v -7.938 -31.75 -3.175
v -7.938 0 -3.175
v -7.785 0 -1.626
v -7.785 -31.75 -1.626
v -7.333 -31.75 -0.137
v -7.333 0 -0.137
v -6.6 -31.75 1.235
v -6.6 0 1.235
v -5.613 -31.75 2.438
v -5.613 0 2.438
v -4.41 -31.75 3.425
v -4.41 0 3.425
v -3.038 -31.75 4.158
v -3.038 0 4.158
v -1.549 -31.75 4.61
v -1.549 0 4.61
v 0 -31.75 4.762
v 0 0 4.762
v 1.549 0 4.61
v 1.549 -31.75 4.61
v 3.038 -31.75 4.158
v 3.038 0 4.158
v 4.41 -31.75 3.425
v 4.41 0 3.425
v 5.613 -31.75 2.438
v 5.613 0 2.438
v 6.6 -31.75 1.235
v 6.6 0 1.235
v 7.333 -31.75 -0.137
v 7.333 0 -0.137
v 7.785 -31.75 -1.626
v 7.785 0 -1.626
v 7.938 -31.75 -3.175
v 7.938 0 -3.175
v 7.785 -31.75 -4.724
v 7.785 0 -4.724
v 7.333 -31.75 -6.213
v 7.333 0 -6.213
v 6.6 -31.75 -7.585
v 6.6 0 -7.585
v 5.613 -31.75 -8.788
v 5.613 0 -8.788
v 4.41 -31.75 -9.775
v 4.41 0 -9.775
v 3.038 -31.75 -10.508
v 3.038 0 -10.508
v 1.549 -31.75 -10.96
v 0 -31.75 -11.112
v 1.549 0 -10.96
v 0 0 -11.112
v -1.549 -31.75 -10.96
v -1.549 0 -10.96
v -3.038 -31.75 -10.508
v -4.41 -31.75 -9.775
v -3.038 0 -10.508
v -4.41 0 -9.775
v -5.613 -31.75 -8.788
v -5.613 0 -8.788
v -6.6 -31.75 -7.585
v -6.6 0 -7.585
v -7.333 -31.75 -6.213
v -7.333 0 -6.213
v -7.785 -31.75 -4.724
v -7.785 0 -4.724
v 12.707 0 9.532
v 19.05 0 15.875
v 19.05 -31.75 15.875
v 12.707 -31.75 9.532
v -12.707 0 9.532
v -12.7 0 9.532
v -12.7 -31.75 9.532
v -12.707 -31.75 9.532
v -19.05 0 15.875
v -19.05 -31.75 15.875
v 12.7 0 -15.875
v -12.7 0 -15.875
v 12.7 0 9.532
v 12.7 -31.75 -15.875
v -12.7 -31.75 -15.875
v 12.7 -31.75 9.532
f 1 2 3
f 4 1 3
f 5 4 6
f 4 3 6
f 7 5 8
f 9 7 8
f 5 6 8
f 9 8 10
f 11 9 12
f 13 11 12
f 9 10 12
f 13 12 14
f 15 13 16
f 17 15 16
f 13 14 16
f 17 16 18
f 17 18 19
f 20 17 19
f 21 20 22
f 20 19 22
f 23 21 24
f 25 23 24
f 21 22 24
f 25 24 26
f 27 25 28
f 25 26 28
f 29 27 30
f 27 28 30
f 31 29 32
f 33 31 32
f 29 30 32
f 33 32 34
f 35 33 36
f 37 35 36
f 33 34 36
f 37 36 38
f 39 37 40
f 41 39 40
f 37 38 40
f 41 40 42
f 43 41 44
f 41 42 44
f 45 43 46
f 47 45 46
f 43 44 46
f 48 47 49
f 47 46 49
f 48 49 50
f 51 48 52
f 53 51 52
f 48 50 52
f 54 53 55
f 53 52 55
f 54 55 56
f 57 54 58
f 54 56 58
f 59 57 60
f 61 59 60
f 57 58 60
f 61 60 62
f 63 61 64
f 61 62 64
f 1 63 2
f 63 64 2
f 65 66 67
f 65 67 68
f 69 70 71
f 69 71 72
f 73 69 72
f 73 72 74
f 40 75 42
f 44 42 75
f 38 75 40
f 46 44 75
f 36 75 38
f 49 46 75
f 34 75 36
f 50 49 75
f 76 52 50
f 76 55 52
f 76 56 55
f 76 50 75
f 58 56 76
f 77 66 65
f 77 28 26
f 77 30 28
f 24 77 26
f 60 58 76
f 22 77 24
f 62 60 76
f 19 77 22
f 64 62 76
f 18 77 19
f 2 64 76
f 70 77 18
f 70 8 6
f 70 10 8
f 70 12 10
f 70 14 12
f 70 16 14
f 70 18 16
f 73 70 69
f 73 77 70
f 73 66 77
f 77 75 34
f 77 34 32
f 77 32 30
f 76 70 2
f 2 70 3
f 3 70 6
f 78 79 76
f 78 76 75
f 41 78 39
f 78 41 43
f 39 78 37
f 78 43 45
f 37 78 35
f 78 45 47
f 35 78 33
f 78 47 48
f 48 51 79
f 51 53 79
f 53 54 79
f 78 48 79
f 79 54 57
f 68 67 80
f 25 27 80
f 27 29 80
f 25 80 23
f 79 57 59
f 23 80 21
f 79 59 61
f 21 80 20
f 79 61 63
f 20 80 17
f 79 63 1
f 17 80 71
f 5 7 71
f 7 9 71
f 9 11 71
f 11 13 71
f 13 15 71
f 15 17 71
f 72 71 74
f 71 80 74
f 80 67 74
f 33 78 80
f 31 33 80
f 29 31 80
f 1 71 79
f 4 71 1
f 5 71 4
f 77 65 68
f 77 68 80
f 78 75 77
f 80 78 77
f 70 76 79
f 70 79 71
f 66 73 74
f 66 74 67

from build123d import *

# Parameters (mm, degrees)
F0_W     = 25.4
F0_H     = 31.75
F1_DEPTH = 31.75
F2_R     = 7.9375
F3_DEPTH = 31.75
F5_DEPTH = 31.75


with BuildPart() as f1:
    # F0 (on Front) → F1 (new body)
    with BuildSketch(Plane.XZ):
        Rectangle(F0_W, F0_H)
    extrude(amount=F1_DEPTH)

    # F2 (on face) → F3 (cut, through all)
    with BuildSketch(Plane(origin=(0, 0, 0), x_dir=(-1, 0, 0), z_dir=(0, 1, 0))):
        with Locations((0, -3.175)):
            Circle(F2_R)
    extrude(amount=-F3_DEPTH, mode=Mode.SUBTRACT)

    # F4 (on face) → F5 (join, through all)
    with BuildSketch(Plane(origin=(0, 0, 0), x_dir=(-1, 0, 0), z_dir=(0, 1, 0))):
        Polygon((19.05, 15.875), (-19.05, 15.875), (-12.707431, 9.532431), (12.707431, 9.532431), align=None)
    extrude(amount=-F5_DEPTH)


solid = f1.part
